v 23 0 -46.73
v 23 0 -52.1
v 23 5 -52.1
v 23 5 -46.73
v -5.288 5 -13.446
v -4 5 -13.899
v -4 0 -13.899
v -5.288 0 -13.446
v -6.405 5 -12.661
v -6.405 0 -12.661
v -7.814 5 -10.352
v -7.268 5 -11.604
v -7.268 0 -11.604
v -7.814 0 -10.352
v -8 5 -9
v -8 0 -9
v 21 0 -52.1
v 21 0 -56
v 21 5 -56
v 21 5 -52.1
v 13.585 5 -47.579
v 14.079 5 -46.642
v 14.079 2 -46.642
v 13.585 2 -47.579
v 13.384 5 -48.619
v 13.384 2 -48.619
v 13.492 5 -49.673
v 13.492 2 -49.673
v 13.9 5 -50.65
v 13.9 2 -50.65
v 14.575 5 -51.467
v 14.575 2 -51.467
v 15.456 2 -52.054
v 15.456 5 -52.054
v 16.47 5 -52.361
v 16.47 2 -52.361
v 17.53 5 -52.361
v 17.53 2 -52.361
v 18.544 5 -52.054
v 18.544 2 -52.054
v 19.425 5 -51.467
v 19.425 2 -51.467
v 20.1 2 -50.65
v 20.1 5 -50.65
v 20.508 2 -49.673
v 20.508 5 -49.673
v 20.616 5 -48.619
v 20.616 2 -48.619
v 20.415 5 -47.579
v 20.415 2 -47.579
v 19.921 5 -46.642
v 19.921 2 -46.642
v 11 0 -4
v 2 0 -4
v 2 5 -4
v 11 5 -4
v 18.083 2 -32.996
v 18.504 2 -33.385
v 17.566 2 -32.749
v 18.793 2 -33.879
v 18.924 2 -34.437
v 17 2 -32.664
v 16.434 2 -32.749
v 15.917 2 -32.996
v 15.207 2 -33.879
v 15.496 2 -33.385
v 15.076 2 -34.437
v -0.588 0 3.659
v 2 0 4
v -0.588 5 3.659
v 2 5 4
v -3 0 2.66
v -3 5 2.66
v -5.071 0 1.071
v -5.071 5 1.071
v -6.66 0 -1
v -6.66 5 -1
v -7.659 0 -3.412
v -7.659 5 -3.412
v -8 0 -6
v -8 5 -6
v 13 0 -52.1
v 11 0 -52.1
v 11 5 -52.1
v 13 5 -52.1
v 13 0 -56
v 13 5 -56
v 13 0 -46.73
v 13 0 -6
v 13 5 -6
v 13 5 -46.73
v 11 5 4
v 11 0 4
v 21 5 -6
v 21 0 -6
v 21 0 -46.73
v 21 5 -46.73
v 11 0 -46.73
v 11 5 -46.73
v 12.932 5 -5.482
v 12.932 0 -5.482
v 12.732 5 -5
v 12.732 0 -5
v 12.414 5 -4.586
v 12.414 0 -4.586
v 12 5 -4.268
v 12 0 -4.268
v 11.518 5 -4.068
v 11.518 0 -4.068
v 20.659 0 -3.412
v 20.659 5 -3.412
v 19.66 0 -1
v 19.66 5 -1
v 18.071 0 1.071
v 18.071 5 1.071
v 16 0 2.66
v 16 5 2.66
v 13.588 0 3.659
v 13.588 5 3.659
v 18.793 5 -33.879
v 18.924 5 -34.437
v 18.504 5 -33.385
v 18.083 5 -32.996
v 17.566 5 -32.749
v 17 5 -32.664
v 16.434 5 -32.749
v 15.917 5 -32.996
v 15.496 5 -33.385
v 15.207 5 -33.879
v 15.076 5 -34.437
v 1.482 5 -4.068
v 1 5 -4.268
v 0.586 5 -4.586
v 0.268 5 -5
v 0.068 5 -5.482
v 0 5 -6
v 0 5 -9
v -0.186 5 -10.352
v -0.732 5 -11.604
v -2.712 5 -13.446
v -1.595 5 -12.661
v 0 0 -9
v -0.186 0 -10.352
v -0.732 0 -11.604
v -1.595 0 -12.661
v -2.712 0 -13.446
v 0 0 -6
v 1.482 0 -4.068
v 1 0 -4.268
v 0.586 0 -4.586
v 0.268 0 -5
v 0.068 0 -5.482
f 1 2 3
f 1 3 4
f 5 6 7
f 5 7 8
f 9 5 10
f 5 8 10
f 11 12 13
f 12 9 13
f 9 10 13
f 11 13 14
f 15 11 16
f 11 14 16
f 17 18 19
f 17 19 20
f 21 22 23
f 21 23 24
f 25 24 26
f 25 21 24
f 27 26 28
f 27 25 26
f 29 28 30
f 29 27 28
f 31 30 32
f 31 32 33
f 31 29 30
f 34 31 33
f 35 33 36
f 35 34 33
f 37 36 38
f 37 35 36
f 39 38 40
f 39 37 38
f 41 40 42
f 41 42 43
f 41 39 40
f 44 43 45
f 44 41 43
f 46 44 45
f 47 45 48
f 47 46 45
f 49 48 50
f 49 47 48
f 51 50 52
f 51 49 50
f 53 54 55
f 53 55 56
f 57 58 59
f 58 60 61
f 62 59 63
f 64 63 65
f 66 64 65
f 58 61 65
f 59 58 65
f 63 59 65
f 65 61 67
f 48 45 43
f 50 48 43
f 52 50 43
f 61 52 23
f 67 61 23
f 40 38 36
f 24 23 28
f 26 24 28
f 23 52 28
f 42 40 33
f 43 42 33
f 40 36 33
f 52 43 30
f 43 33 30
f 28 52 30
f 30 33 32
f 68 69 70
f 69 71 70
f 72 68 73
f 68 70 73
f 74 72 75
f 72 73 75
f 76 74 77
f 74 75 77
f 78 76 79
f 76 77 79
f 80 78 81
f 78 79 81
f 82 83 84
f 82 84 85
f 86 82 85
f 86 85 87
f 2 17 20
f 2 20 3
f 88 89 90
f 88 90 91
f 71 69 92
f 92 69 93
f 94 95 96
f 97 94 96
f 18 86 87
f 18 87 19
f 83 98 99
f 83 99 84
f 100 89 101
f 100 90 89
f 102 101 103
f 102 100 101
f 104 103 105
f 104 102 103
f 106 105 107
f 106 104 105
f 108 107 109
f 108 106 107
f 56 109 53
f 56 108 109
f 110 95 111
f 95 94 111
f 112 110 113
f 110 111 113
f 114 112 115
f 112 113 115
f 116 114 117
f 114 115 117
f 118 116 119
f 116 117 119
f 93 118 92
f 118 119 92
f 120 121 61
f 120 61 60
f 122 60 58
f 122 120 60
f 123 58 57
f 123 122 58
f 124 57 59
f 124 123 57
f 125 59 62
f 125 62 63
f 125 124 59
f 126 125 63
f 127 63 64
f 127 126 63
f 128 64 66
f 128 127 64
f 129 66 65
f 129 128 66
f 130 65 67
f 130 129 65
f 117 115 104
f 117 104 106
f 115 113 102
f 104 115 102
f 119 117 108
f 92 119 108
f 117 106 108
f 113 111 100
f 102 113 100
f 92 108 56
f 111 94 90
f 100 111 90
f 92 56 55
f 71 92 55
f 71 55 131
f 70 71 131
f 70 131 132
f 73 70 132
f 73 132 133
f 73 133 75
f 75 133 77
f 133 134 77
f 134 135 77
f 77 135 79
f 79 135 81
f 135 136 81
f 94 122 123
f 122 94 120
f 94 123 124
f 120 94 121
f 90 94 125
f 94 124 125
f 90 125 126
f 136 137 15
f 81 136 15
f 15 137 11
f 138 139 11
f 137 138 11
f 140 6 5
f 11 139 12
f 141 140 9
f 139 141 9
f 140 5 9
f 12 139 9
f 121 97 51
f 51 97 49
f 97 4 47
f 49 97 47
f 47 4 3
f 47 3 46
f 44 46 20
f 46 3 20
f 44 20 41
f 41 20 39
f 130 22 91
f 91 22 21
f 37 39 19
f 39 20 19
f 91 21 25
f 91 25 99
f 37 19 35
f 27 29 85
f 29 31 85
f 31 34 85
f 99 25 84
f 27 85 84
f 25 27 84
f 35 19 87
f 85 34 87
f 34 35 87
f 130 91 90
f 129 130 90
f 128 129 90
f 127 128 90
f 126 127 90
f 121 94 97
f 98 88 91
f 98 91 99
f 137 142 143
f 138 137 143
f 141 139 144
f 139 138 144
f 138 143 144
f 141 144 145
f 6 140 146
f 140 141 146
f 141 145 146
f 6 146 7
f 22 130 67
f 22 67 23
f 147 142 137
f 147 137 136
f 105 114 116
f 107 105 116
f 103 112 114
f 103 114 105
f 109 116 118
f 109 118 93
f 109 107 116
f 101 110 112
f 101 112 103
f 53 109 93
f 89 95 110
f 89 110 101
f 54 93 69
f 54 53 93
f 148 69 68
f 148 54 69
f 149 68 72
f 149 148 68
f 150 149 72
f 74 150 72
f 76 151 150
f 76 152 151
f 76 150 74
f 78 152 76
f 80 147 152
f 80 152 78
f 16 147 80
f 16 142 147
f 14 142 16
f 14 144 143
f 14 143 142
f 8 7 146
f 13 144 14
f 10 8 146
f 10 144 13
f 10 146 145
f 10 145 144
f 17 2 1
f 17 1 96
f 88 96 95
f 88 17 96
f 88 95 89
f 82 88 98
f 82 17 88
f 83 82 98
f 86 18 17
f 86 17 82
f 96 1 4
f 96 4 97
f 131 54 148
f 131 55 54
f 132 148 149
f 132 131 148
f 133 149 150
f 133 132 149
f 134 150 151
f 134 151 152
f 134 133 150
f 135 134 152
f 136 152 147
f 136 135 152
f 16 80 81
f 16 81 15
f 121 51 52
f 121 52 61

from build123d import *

# Parameters (mm, degrees)
BOSS_EXTRUDE1_DEPTH = 5
CUT_EXTRUDE3_DEPTH  = 3
FILLET2_R           = 10
FILLET3_R           = 5
FILLET4_R           = 2


with BuildPart() as part:
    # Sketch1 → Boss-Extrude1 (new body)
    with BuildSketch(Plane(origin=(0, 0, 0), x_dir=(1, 0, 0), z_dir=(0, 1, 0))):
        Polygon((0, 4), (13, 4), (13, 46.73), (11, 46.73), (11, 52.1), (13, 52.1), (13, 56), (21, 56), (21, 52.1), (23, 52.1), (23, 46.73), (21, 46.73), (21, 4), (21, -4), (13, -4), (0, -4), (-8, -4), (-8, 14), (0, 14), align=None)
    extrude(amount=BOSS_EXTRUDE1_DEPTH)

    # Sketch2 → Cut-Extrude3 (cut)
    with BuildSketch(Plane(origin=(0, 5, 0), x_dir=(1, 0, 0), z_dir=(0, 1, 0))):
        with BuildLine():
            Line((19.921, 46.641739258), (18.923587356, 34.436800493))
            ThreePointArc((18.923587356, 34.436800493), (17, 32.664), (15.076412644, 34.436800493))
            Line((15.076412644, 34.436800493), (14.079, 46.641739258))
            ThreePointArc((14.079, 46.641739258), (17, 52.4), (19.921, 46.641739258))
        make_face()
    extrude(amount=-CUT_EXTRUDE3_DEPTH, mode=Mode.SUBTRACT)

    # Fillet2
    fillet2_edges = [part.edges().sort_by_distance(p)[0] for p in [
        (21, 2.5, 4),
        (-8, 2.5, 4),
    ]]
    fillet(fillet2_edges, radius=FILLET2_R)

    # Fillet3
    # the kernel refuses this fillet: 5 mm, written as the material it takes off along each edge
    with BuildSketch(Plane(origin=(0, -12.5, -14), x_dir=(-1, 0, 0), z_dir=(0, 1, 0)), Plane(origin=(-8, -12.5, -14), x_dir=(0, 0, 1), z_dir=(0, 1, 0))) as fillet3_piece_1:
        with BuildLine():
            CenterArc((FILLET3_R, FILLET3_R), FILLET3_R, 180, 90)
            Line((0, FILLET3_R), (0, 0))
            Line((0, 0), (FILLET3_R, 0))
        make_face()
    extrude(amount=30, mode=Mode.SUBTRACT)

    # Fillet4
    fillet4_edges = [part.edges().sort_by_distance(p)[0] for p in [
        (0, 2.5, -4),
        (13, 2.5, -4),
    ]]
    fillet(fillet4_edges, radius=FILLET4_R)


solid = part.part
